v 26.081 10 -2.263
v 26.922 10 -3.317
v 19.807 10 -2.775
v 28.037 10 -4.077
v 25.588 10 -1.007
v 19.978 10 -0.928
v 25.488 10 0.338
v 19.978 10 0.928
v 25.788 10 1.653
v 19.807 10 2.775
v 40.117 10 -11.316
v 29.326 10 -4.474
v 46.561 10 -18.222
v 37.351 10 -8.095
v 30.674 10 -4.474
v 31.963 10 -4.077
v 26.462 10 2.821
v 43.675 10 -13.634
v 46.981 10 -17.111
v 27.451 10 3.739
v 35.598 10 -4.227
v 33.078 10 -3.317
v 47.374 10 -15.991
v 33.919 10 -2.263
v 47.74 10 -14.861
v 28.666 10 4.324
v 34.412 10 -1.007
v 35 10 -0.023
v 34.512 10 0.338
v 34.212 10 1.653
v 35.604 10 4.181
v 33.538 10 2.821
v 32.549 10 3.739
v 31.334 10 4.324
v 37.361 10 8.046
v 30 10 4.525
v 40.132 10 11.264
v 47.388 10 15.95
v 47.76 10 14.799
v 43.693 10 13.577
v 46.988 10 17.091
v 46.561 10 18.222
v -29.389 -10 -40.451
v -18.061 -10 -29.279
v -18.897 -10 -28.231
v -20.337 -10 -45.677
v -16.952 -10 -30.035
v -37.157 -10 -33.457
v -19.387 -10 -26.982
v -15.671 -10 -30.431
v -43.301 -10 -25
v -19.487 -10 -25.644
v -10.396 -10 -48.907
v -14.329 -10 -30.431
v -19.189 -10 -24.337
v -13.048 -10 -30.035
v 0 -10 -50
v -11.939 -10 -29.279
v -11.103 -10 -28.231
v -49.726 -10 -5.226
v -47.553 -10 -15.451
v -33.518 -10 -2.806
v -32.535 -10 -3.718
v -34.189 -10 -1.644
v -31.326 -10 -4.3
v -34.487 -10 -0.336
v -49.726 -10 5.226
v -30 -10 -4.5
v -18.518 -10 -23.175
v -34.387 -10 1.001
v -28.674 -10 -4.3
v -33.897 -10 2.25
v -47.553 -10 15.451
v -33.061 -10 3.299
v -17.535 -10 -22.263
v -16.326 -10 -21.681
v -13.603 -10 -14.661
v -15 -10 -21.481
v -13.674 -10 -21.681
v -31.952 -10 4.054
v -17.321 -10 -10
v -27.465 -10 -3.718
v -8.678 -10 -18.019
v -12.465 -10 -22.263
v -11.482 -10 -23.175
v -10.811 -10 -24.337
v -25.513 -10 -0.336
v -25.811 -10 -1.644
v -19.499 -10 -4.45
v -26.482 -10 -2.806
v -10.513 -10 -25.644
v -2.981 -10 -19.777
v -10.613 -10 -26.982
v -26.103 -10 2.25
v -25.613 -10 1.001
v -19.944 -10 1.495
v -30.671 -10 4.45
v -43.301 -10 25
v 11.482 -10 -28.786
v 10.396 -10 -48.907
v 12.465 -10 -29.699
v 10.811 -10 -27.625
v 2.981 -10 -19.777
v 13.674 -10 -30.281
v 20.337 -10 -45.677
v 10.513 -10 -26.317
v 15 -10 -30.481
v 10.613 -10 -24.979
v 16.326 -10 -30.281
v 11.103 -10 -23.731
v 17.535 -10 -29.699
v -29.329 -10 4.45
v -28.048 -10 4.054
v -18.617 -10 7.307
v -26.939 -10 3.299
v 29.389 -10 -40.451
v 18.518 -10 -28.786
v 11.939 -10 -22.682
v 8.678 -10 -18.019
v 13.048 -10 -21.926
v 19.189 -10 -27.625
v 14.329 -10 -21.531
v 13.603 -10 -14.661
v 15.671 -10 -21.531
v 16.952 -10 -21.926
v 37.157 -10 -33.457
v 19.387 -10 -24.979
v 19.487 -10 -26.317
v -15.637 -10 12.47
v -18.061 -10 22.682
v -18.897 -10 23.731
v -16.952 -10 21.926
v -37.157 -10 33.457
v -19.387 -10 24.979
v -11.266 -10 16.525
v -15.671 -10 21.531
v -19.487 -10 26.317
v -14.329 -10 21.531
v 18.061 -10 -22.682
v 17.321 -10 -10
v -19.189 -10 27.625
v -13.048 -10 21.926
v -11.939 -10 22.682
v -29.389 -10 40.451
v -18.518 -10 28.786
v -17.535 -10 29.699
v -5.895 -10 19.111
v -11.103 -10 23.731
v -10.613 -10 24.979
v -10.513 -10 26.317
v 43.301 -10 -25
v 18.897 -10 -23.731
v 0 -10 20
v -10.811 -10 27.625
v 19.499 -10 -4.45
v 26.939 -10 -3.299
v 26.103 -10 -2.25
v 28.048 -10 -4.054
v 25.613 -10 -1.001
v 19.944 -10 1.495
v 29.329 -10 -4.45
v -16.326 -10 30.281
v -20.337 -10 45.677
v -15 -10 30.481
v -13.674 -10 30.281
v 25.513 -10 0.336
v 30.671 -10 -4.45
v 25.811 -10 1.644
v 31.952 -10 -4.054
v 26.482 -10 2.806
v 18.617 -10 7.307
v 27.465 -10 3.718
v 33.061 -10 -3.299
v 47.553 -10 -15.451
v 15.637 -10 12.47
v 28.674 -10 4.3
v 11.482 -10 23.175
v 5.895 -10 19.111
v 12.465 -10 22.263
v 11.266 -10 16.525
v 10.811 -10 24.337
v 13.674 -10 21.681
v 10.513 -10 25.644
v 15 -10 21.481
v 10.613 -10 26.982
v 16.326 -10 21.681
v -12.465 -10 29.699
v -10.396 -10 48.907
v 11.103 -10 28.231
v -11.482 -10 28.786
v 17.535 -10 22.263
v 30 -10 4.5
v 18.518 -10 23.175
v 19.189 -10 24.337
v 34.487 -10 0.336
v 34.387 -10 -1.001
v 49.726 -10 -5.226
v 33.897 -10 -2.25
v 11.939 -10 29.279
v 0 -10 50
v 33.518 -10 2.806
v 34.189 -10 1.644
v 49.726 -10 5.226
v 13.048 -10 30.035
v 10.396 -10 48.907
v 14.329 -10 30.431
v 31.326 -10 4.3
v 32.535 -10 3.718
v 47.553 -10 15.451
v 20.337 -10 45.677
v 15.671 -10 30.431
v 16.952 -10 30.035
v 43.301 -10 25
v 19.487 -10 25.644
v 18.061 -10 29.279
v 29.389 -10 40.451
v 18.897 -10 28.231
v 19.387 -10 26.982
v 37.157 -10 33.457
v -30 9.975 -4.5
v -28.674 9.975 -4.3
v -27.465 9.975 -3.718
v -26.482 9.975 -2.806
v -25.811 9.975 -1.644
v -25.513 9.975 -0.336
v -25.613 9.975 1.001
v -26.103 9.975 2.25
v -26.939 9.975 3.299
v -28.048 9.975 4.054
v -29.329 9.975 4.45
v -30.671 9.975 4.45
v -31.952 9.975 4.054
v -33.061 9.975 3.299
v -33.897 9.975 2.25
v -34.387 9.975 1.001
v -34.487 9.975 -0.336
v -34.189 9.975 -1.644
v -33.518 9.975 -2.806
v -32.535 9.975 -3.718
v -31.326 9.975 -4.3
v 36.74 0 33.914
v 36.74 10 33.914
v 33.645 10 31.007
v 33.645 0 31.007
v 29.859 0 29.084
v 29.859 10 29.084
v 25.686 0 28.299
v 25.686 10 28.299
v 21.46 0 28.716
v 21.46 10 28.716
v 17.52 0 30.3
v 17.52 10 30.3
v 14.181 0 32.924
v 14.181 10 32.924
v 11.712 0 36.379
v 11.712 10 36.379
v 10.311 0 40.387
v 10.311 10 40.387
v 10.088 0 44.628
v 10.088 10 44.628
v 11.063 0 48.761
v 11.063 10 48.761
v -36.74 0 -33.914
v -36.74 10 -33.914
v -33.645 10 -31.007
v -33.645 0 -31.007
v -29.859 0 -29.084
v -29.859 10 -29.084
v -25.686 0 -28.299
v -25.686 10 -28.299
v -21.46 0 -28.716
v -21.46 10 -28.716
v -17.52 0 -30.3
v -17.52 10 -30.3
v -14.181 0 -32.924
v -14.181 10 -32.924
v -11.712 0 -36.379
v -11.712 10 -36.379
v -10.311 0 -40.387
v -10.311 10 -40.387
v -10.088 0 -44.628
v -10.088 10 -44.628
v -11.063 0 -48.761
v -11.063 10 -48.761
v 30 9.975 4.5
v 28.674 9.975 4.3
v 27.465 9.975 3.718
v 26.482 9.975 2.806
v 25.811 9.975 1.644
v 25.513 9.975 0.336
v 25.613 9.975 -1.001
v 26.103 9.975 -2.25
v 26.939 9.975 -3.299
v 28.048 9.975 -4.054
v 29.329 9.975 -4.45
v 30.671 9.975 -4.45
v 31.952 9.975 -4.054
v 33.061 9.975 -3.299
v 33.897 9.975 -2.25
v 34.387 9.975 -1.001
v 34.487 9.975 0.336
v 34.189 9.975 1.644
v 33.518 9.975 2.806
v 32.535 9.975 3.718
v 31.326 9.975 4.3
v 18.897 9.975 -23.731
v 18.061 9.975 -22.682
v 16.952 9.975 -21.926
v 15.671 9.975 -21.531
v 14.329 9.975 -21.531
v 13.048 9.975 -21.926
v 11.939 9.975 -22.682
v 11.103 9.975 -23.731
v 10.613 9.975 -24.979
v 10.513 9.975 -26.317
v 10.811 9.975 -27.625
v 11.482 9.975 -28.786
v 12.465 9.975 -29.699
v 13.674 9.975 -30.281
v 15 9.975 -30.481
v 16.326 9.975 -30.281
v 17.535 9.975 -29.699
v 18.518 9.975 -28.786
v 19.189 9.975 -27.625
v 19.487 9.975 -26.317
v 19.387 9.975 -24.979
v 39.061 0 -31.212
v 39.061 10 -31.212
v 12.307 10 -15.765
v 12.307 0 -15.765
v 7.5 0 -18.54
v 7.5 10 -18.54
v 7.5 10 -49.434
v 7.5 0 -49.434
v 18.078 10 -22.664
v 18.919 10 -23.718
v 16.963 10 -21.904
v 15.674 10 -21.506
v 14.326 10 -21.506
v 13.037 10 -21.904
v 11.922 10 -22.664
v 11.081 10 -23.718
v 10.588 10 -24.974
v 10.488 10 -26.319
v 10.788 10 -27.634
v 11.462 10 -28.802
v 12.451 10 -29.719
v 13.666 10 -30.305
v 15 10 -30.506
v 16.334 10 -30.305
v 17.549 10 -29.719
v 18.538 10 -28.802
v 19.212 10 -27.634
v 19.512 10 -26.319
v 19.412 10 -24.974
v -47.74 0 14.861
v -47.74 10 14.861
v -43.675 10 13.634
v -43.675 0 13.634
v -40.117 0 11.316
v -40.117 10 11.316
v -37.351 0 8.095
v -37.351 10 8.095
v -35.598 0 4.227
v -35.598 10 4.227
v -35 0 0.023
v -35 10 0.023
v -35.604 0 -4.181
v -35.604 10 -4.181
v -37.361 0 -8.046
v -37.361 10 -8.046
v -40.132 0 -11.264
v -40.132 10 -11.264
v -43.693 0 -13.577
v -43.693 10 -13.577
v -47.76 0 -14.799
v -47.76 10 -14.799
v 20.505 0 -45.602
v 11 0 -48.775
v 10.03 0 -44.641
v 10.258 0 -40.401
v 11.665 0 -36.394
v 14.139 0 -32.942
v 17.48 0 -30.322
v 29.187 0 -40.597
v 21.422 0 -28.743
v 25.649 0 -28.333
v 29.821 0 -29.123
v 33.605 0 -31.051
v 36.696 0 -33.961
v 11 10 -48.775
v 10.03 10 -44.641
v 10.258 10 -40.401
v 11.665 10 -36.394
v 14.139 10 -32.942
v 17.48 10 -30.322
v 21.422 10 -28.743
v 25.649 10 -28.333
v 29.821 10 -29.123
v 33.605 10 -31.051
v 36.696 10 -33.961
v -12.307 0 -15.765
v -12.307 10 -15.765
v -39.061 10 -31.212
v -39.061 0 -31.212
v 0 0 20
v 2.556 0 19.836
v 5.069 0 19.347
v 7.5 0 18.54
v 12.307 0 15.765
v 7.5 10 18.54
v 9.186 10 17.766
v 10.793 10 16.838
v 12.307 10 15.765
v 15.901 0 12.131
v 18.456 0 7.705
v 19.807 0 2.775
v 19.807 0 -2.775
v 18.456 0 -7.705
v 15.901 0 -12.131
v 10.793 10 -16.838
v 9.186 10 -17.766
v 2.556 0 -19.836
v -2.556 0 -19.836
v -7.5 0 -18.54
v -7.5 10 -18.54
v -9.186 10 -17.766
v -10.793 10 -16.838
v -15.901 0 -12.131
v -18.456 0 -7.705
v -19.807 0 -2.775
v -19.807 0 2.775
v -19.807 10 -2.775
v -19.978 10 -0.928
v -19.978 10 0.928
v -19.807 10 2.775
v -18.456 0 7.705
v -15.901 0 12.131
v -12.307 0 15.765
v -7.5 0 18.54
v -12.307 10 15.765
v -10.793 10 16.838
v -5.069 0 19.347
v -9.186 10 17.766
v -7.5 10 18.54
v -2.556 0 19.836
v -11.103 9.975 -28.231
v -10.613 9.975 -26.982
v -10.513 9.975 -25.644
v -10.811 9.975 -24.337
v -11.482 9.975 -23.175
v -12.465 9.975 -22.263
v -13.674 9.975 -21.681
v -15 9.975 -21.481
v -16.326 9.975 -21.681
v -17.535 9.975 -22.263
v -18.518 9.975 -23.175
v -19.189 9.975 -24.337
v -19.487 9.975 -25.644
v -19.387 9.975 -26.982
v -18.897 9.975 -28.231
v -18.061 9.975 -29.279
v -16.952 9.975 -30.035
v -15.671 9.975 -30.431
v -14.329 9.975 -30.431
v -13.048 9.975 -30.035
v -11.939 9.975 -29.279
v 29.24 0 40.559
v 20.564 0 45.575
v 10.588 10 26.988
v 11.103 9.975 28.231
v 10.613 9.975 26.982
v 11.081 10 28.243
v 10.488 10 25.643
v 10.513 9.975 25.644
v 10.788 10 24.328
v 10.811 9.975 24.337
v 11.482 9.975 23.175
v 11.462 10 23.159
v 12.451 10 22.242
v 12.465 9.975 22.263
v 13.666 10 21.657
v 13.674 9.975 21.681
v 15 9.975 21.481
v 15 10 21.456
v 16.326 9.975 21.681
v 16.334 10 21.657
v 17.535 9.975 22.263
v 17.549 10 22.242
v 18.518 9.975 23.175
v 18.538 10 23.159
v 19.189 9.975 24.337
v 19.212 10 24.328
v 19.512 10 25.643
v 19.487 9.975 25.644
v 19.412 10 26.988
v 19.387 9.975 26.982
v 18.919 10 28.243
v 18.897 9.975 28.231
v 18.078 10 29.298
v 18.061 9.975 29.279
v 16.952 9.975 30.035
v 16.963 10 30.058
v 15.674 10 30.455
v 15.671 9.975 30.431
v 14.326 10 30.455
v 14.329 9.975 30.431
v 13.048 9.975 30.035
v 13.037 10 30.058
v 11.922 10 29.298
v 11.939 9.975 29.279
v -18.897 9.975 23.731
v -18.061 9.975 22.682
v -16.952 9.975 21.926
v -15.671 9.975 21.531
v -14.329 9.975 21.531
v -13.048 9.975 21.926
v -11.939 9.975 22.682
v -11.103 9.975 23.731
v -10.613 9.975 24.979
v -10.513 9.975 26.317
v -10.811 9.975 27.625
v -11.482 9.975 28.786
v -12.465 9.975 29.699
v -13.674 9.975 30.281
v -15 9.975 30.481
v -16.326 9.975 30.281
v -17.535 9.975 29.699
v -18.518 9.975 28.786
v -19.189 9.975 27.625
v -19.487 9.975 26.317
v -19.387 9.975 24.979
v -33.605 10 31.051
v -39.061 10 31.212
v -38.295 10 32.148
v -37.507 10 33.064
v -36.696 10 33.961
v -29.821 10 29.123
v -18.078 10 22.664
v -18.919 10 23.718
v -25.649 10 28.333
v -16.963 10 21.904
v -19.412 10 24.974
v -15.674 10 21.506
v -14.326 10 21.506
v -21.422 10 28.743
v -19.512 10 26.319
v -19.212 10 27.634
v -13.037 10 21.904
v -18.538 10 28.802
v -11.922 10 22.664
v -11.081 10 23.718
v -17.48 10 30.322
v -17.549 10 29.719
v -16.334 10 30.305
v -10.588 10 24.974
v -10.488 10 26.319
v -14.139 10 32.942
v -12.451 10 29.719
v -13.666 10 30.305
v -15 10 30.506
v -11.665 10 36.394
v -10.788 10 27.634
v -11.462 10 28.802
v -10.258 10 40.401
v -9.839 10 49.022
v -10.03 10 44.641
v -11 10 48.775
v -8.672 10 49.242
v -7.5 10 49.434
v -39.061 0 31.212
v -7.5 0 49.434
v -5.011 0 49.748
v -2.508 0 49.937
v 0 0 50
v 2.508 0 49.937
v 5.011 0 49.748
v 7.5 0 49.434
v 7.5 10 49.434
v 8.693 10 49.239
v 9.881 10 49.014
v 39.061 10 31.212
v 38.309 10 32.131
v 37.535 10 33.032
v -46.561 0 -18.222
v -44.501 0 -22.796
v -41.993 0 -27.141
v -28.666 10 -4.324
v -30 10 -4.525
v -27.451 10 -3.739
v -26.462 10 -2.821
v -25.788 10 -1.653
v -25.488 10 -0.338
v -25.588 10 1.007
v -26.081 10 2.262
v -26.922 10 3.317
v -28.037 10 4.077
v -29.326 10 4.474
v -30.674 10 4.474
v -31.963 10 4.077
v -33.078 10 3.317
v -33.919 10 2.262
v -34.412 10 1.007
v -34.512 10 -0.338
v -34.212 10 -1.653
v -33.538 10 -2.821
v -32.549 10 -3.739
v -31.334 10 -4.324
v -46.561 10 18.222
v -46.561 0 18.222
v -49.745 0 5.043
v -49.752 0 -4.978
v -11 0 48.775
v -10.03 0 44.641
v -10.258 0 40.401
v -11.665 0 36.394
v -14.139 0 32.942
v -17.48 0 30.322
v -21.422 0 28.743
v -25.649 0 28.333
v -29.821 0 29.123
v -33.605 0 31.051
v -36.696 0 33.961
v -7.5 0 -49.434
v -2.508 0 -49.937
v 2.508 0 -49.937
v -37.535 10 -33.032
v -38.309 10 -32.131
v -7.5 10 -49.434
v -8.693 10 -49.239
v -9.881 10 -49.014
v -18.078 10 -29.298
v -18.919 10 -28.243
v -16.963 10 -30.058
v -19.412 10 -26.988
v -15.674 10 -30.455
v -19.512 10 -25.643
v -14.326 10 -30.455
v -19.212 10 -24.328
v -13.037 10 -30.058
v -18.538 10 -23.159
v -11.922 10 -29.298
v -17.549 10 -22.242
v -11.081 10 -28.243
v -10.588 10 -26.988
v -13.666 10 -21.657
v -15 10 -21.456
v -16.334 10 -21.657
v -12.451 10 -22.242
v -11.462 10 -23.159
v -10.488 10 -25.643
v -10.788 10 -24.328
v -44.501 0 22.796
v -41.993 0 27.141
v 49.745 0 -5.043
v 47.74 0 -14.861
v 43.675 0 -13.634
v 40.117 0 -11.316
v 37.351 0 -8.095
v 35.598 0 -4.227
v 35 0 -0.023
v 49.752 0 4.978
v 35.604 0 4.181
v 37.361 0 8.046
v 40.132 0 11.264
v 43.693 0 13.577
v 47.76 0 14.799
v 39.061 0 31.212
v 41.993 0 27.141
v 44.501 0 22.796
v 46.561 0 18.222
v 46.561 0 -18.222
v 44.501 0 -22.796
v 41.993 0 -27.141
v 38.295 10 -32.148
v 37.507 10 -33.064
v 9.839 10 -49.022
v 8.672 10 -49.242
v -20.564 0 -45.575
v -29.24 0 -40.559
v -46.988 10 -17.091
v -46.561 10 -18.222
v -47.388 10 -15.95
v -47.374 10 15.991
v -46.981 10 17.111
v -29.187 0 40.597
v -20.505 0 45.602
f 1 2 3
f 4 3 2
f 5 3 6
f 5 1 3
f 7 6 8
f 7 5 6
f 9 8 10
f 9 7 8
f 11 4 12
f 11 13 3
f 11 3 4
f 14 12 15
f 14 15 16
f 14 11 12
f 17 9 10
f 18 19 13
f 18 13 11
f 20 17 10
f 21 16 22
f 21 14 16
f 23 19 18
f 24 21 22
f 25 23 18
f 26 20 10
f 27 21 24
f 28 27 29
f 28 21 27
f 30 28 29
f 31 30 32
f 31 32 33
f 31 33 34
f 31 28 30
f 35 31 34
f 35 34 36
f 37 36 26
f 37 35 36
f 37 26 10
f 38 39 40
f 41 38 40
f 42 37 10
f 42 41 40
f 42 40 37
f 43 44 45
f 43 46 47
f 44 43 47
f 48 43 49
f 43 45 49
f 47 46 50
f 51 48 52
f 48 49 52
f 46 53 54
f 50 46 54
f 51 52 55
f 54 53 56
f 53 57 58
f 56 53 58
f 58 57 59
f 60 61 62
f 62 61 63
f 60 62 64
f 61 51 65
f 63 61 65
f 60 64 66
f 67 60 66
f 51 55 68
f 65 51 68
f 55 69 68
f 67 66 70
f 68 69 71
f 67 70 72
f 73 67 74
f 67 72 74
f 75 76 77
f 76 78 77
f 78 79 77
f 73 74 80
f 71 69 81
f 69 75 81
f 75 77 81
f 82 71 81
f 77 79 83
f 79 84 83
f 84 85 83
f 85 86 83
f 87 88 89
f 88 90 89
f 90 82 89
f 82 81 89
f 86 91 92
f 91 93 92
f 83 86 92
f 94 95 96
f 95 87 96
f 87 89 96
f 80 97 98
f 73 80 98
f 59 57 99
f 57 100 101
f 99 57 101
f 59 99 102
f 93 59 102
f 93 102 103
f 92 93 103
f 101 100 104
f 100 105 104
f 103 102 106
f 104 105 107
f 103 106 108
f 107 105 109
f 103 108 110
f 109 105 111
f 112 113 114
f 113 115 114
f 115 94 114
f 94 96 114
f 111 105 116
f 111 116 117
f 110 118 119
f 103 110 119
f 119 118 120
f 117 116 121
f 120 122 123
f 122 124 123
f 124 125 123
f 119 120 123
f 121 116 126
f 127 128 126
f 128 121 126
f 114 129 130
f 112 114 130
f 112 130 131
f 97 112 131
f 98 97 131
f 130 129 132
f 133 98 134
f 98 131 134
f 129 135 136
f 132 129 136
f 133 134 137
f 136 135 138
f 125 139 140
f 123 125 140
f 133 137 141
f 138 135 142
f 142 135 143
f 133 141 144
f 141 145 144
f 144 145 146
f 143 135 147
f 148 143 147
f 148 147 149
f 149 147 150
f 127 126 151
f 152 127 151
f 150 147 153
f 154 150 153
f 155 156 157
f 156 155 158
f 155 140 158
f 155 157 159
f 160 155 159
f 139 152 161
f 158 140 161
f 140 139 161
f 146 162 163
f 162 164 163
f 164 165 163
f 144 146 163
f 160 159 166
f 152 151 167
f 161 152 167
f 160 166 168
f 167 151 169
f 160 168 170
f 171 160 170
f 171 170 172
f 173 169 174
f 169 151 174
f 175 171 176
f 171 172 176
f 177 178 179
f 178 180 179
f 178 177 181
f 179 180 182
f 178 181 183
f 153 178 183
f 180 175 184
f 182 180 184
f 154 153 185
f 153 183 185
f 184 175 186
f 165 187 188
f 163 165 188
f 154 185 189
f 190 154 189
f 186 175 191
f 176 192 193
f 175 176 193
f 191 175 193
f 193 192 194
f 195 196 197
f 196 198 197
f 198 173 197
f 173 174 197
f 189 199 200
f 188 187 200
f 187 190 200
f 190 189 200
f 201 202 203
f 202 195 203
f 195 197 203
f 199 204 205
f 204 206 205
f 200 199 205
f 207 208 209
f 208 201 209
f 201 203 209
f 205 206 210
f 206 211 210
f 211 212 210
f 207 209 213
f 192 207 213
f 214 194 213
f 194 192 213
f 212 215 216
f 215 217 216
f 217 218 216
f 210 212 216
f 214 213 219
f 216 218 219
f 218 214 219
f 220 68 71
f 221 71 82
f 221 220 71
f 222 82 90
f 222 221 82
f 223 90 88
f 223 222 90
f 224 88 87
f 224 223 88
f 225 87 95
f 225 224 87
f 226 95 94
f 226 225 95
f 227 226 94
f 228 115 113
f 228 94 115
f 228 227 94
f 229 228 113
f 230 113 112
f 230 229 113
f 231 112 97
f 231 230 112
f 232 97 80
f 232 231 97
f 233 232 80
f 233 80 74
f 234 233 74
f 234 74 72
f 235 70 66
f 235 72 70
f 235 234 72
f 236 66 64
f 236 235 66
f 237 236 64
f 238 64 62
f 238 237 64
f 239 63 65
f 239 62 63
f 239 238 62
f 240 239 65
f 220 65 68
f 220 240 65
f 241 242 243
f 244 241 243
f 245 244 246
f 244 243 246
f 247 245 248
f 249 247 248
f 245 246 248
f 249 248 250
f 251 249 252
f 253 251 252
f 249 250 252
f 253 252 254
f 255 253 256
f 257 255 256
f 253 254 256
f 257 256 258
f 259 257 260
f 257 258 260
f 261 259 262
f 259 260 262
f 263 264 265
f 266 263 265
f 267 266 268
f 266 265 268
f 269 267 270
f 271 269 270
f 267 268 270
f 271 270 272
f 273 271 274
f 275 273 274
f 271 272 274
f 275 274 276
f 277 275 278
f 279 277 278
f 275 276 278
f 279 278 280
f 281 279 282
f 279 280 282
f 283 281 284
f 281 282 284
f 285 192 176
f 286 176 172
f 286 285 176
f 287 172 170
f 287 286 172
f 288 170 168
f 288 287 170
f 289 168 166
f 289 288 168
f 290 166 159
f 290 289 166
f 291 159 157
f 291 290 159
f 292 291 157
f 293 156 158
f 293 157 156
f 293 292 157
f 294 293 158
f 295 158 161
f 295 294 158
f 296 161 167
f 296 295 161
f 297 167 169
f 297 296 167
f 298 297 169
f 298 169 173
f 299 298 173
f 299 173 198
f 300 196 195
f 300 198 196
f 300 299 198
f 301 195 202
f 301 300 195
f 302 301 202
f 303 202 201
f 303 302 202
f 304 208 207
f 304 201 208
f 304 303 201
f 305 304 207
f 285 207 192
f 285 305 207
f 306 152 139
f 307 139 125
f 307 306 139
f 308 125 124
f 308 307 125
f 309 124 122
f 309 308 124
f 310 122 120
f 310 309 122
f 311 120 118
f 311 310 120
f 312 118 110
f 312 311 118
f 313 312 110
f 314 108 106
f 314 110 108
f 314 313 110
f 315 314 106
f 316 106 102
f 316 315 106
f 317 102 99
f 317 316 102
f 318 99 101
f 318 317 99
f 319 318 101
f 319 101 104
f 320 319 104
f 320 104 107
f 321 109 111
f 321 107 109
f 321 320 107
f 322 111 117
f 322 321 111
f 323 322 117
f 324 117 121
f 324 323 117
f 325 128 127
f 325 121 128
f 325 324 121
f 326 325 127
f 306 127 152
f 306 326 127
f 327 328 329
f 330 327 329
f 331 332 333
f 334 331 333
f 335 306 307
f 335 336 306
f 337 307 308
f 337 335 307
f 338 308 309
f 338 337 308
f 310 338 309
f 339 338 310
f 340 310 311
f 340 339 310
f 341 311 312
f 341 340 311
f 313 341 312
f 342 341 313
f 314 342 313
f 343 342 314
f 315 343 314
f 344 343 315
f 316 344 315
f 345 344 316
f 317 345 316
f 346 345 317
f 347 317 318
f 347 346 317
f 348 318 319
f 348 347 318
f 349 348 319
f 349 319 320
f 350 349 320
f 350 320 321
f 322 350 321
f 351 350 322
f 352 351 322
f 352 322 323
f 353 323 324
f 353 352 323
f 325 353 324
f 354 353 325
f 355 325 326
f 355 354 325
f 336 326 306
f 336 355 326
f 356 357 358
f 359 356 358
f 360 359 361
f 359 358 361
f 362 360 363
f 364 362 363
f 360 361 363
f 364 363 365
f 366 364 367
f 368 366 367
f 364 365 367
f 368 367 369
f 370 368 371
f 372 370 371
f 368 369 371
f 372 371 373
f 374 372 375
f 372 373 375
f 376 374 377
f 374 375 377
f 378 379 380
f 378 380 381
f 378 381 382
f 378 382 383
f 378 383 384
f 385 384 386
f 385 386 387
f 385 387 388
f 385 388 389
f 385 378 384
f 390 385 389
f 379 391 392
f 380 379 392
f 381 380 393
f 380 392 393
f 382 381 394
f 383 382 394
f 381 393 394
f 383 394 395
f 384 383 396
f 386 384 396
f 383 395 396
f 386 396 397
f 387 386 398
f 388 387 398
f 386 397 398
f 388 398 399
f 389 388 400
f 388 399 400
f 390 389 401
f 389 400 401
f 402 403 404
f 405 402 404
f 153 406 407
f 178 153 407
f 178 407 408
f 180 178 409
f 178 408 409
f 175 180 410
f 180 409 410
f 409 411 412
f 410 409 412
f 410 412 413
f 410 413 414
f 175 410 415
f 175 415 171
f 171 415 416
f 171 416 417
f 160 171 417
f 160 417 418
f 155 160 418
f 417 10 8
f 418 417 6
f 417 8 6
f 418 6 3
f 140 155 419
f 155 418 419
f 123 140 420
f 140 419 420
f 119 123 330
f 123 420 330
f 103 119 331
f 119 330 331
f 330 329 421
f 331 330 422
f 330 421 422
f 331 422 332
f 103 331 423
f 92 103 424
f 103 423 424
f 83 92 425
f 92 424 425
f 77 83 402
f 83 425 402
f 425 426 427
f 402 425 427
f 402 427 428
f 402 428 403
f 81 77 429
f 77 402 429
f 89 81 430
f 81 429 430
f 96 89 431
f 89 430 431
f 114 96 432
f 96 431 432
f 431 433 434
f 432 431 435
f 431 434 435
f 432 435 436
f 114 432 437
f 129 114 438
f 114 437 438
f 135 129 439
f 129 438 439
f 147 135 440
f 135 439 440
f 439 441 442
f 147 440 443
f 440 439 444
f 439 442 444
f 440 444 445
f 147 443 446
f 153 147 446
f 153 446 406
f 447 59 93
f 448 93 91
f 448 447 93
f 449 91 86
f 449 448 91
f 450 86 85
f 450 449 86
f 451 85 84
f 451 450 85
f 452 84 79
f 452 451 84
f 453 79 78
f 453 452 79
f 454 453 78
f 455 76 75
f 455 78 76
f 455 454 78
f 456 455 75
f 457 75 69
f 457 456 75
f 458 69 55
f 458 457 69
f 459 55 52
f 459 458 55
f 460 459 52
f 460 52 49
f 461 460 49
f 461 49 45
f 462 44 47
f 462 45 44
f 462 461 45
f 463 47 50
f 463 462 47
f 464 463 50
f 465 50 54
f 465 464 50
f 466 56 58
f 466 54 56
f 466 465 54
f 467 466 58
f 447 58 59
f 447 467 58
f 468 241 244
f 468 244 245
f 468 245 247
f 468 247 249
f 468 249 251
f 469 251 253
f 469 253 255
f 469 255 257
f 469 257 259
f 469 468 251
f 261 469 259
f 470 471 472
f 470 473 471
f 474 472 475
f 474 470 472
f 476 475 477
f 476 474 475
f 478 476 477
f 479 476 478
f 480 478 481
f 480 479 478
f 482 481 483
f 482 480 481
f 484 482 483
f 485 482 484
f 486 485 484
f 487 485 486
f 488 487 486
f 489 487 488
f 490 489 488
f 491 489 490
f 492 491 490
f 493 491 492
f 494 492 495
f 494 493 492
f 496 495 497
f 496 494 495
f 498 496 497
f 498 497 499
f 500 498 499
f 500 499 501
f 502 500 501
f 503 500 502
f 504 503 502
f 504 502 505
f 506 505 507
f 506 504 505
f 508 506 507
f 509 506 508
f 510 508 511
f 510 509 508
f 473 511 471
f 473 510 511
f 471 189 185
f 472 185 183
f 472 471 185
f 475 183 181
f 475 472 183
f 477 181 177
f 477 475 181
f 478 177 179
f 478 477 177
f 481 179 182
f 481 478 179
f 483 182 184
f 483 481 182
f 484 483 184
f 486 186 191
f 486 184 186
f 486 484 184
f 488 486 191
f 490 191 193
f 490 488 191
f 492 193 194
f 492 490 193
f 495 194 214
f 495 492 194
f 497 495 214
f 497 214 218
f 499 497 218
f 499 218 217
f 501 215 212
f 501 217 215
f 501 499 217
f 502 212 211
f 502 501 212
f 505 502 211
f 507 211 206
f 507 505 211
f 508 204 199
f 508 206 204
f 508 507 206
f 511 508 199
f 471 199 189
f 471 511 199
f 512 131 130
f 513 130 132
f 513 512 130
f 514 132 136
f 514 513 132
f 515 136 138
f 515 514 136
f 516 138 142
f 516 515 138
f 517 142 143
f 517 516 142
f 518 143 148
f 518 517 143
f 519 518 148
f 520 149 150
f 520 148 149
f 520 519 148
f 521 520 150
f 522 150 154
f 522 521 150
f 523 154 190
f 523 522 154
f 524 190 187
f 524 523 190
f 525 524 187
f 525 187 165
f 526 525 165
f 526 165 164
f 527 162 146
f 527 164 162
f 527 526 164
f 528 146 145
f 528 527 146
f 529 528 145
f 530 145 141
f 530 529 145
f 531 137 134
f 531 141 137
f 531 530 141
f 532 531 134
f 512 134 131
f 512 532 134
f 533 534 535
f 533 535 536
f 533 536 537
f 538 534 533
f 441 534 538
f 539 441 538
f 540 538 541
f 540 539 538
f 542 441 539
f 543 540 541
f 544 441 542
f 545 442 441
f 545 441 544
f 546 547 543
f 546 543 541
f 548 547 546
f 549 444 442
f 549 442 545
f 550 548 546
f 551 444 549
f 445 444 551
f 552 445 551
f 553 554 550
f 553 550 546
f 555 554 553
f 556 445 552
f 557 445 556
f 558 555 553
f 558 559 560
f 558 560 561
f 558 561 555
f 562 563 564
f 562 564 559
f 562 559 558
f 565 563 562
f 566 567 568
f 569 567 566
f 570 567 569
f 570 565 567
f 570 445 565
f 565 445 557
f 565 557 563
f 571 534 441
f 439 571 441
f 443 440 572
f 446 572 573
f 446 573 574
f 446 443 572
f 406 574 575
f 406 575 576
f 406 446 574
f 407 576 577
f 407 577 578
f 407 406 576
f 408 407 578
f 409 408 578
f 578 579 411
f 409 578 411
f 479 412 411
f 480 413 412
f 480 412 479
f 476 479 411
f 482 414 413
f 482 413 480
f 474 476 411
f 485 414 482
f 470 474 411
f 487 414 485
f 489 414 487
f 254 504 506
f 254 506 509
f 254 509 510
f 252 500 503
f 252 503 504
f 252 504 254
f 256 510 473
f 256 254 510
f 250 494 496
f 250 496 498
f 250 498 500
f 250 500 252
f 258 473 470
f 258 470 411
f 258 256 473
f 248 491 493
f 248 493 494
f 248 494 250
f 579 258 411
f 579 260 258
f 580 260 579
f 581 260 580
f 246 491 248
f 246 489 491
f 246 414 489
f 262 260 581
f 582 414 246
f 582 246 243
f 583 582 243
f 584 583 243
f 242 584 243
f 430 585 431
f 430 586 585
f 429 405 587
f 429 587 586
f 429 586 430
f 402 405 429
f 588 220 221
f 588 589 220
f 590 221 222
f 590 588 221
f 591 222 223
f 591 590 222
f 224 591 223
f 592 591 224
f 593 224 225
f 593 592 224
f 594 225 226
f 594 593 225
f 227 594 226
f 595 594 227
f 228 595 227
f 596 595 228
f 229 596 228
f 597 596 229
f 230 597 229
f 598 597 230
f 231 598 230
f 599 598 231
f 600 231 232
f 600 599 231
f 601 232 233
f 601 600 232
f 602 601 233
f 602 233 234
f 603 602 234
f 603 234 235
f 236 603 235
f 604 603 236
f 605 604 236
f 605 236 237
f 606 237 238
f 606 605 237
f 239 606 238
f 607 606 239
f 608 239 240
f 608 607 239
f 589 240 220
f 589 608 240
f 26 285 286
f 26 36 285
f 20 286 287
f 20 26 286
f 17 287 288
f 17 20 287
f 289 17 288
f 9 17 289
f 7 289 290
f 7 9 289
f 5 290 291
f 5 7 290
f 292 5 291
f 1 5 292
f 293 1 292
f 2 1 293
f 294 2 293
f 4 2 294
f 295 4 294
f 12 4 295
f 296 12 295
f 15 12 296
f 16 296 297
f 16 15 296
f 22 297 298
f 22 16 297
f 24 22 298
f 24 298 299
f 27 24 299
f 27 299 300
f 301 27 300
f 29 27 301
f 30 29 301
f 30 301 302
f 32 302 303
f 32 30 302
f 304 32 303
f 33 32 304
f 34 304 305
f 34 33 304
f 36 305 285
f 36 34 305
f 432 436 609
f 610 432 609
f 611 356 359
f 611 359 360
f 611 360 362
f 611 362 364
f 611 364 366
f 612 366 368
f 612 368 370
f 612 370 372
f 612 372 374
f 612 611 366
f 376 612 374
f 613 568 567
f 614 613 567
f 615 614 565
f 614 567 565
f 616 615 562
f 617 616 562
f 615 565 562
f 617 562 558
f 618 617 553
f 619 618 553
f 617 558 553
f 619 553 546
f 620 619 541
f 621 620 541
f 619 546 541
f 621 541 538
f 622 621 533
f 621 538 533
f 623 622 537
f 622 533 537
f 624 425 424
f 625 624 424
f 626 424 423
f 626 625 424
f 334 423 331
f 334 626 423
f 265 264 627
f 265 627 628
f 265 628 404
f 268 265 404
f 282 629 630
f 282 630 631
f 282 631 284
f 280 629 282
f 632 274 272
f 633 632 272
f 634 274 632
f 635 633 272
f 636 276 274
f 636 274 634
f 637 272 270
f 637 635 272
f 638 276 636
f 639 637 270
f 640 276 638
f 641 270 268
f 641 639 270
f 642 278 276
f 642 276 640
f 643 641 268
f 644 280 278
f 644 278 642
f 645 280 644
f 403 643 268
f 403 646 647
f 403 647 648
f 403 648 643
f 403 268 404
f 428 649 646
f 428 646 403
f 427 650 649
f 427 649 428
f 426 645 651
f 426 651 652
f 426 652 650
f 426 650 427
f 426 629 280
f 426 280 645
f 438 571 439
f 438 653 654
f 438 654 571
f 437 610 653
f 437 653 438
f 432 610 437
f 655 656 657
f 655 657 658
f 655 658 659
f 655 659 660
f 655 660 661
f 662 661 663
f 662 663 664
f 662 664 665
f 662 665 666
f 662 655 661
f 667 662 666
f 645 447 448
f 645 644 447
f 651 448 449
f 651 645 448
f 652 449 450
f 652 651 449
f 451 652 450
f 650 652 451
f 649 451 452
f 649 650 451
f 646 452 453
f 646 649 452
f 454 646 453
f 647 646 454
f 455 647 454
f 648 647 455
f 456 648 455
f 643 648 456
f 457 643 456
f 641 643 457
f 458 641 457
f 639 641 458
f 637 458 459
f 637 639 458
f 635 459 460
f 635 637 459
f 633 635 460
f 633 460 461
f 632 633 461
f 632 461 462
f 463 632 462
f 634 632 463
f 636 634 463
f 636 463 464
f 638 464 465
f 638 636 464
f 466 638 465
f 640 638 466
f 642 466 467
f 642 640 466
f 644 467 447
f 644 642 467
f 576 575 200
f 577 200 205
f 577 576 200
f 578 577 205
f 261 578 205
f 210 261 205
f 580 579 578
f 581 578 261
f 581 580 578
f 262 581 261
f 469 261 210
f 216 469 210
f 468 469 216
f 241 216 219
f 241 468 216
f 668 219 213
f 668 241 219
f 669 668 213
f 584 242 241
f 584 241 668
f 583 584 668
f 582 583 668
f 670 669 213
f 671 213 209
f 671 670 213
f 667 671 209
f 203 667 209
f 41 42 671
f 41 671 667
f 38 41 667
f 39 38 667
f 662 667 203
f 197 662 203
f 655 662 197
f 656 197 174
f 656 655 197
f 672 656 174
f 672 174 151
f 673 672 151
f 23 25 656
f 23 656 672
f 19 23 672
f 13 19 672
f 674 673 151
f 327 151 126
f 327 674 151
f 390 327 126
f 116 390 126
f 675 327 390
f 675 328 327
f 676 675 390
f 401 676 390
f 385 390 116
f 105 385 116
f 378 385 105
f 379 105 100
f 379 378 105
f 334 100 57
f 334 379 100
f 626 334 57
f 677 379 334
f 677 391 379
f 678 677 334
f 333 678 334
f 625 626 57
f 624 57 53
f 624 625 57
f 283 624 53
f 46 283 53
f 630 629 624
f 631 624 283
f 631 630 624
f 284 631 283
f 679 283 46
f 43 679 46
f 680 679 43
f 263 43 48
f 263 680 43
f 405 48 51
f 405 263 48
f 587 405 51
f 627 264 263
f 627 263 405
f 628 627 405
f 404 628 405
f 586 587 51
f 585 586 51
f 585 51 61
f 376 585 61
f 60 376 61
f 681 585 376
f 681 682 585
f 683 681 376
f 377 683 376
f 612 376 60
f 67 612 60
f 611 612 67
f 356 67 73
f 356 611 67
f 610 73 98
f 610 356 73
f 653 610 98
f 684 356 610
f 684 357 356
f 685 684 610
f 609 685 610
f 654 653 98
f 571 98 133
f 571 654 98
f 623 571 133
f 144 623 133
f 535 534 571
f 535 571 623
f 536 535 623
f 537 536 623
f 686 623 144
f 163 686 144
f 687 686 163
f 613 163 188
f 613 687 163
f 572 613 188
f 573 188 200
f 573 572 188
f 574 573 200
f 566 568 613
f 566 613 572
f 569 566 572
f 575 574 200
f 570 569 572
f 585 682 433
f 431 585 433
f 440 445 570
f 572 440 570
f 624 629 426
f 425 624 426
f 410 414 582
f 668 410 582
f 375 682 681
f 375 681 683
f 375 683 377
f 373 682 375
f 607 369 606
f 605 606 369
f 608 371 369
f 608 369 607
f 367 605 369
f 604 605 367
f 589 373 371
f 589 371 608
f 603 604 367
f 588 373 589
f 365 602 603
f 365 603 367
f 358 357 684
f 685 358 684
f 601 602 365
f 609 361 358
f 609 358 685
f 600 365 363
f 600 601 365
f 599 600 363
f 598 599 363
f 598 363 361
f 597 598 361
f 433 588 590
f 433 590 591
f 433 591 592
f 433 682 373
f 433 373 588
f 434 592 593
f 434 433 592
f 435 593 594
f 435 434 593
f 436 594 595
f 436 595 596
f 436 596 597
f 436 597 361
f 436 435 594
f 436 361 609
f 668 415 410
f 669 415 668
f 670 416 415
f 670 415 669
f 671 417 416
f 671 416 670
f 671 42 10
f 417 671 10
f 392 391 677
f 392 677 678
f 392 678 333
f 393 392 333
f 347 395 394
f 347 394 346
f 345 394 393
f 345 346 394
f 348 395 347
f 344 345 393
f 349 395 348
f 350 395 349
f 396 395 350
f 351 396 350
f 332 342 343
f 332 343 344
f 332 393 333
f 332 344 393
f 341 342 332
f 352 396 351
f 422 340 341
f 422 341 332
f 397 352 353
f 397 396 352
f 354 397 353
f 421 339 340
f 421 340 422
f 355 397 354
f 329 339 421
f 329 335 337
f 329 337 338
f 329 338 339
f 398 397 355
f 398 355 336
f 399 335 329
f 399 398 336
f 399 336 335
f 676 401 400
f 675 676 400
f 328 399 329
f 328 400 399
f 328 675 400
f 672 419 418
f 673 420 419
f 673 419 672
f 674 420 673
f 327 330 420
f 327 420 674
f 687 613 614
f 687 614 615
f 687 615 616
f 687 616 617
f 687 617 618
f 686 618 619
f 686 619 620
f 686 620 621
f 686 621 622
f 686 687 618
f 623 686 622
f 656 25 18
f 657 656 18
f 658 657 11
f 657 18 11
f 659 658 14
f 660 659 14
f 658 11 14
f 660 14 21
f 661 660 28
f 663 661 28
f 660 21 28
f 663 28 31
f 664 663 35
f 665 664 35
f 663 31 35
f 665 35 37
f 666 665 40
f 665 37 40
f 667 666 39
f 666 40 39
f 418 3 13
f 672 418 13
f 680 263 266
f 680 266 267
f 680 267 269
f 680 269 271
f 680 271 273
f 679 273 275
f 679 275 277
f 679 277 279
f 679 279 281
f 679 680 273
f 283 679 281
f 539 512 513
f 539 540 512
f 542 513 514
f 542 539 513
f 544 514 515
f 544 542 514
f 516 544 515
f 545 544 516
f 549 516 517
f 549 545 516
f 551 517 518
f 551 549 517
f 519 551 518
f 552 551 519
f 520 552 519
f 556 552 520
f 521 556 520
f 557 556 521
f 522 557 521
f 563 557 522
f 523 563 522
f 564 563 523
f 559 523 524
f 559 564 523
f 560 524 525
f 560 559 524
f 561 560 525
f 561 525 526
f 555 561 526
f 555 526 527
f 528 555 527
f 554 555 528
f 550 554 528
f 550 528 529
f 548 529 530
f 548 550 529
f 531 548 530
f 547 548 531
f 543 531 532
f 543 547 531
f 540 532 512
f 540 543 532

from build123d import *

# Parameters (mm, degrees)
SKETCH1_R           = 50
BOSS_EXTRUDE1_DEPTH = 10
SKETCH2_R           = 20
CUT_EXTRUDE1_DEPTH  = 74.484692283
CUT_EXTRUDE2_DEPTH  = 10
CUT_EXTRUDE3_DEPTH  = 10
CIRPATTERN1_COUNT   = 6
CIRPATTERN2_COUNT   = 6


with BuildPart() as part:
    # Sketch1 → Boss-Extrude1 (new, symmetric)
    with BuildSketch(Plane(origin=(0, 0, 0), x_dir=(1, 0, 0), z_dir=(0, 1, 0))):
        with Locations(Location((0, 0, 0), (0, 0, 270))):
            Circle(SKETCH1_R)
    extrude(amount=BOSS_EXTRUDE1_DEPTH, both=True)

    # Sketch2 → Cut-Extrude1 (cut, through all)
    with BuildSketch(Plane(origin=(0, 10, 0), x_dir=(1, 0, 0), z_dir=(0, 1, 0))):
        with Locations(Location((0, 0, 0), (0, 0, 270))):
            Circle(SKETCH2_R)
    extrude(amount=-CUT_EXTRUDE1_DEPTH, mode=Mode.SUBTRACT)

    # Sketch3 → Cut-Extrude2 (cut)
    with BuildSketch(Plane(origin=(0, 10, 0), x_dir=(1, 0, 0), z_dir=(0, 1, 0))):
        with BuildLine():
            Line((-7.5, 49.434299833), (-7.5, 18.540496218))
            ThreePointArc((-7.5, 18.540496218), (0, 20), (7.5, 18.540496218))
            Line((7.5, 18.540496218), (7.5, 49.434299833))
            ThreePointArc((7.5, 49.434299833), (0, 50), (-7.5, 49.434299833))
        make_face()
        with BuildLine():
            Line((39.061359474, 31.212340445), (12.306540723, 15.765438637))
            ThreePointArc((12.306540723, 15.765438637), (17.320508076, 10), (19.806540723, 2.77505758))
            Line((19.806540723, 2.77505758), (46.561359474, 18.221959388))
            ThreePointArc((46.561359474, 18.221959388), (43.301270189, 25), (39.061359474, 31.212340445))
        make_face()
        with BuildLine():
            Line((46.561359474, -18.221959388), (19.806540723, -2.77505758))
            ThreePointArc((19.806540723, -2.77505758), (17.320508076, -10), (12.306540723, -15.765438637))
            Line((12.306540723, -15.765438637), (39.061359474, -31.212340445))
            ThreePointArc((39.061359474, -31.212340445), (43.301270189, -25), (46.561359474, -18.221959388))
        make_face()
        with BuildLine():
            Line((7.5, -49.434299833), (7.5, -18.540496218))
            ThreePointArc((7.5, -18.540496218), (0, -20), (-7.5, -18.540496218))
            Line((-7.5, -18.540496218), (-7.5, -49.434299833))
            ThreePointArc((-7.5, -49.434299833), (0, -50), (7.5, -49.434299833))
        make_face()
        with BuildLine():
            Line((-39.061359474, -31.212340445), (-12.306540723, -15.765438637))
            ThreePointArc((-12.306540723, -15.765438637), (-17.320508076, -10), (-19.806540723, -2.77505758))
            Line((-19.806540723, -2.77505758), (-46.561359474, -18.221959388))
            ThreePointArc((-46.561359474, -18.221959388), (-43.301270189, -25), (-39.061359474, -31.212340445))
        make_face()
        with BuildLine():
            Line((-46.561359474, 18.221959388), (-19.806540723, 2.77505758))
            ThreePointArc((-19.806540723, 2.77505758), (-17.320508076, 10), (-12.306540723, 15.765438637))
            Line((-12.306540723, 15.765438637), (-39.061359474, 31.212340445))
            ThreePointArc((-39.061359474, 31.212340445), (-43.301270189, 25), (-46.561359474, 18.221959388))
        make_face()
    extrude(amount=-CUT_EXTRUDE2_DEPTH, mode=Mode.SUBTRACT)

    # Sketch4 → Cut-Extrude3 (cut)
    with BuildSketch(Plane(origin=(0, 10, 0), x_dir=(1, 0, 0), z_dir=(0, 1, 0))):
        with BuildLine():
            ThreePointArc((11, 48.774993593), (17.480362162, 30.322218565), (36.696416757, 33.961345633))
            ThreePointArc((36.696416757, 33.961345633), (24.971945946, 43.317455092), (11, 48.774993593))
        make_face()
    cut_extrude3 = extrude(amount=-CUT_EXTRUDE3_DEPTH, mode=Mode.SUBTRACT)

    # Sketch6 → Tap Drill for M10x1.0 Tap1 (revolve, cut)
    with BuildSketch(Plane(origin=(30, 10, 0), x_dir=(0, 0, 1), z_dir=(1, 0, 0))):
        Polygon((0, 0), (0, 72.703872786), (4.5, 70), (4.5, 0.025), (4.525, 0), align=None)
    tap_drill_for_m10x1_0_tap1 = revolve(axis=Axis((30, 16.35, 0), (0, -1, 0)), mode=Mode.SUBTRACT)

    # CirPattern1: Tap Drill for M10x1.0 Tap1 ×6 about axis
    cirpattern1_axis = Axis((0, 0, 0), (0, 1, 0))
    for i in range(1, CIRPATTERN1_COUNT):
        add(tap_drill_for_m10x1_0_tap1.rotate(cirpattern1_axis, i * 360 / CIRPATTERN1_COUNT), mode=Mode.SUBTRACT)

    # CirPattern2: Cut-Extrude3 ×6 about axis
    cirpattern2_axis = Axis((0, 0, 0), (0, 1, 0))
    for i in range(1, CIRPATTERN2_COUNT):
        add(cut_extrude3.rotate(cirpattern2_axis, i * 360 / CIRPATTERN2_COUNT), mode=Mode.SUBTRACT)


solid = part.part
